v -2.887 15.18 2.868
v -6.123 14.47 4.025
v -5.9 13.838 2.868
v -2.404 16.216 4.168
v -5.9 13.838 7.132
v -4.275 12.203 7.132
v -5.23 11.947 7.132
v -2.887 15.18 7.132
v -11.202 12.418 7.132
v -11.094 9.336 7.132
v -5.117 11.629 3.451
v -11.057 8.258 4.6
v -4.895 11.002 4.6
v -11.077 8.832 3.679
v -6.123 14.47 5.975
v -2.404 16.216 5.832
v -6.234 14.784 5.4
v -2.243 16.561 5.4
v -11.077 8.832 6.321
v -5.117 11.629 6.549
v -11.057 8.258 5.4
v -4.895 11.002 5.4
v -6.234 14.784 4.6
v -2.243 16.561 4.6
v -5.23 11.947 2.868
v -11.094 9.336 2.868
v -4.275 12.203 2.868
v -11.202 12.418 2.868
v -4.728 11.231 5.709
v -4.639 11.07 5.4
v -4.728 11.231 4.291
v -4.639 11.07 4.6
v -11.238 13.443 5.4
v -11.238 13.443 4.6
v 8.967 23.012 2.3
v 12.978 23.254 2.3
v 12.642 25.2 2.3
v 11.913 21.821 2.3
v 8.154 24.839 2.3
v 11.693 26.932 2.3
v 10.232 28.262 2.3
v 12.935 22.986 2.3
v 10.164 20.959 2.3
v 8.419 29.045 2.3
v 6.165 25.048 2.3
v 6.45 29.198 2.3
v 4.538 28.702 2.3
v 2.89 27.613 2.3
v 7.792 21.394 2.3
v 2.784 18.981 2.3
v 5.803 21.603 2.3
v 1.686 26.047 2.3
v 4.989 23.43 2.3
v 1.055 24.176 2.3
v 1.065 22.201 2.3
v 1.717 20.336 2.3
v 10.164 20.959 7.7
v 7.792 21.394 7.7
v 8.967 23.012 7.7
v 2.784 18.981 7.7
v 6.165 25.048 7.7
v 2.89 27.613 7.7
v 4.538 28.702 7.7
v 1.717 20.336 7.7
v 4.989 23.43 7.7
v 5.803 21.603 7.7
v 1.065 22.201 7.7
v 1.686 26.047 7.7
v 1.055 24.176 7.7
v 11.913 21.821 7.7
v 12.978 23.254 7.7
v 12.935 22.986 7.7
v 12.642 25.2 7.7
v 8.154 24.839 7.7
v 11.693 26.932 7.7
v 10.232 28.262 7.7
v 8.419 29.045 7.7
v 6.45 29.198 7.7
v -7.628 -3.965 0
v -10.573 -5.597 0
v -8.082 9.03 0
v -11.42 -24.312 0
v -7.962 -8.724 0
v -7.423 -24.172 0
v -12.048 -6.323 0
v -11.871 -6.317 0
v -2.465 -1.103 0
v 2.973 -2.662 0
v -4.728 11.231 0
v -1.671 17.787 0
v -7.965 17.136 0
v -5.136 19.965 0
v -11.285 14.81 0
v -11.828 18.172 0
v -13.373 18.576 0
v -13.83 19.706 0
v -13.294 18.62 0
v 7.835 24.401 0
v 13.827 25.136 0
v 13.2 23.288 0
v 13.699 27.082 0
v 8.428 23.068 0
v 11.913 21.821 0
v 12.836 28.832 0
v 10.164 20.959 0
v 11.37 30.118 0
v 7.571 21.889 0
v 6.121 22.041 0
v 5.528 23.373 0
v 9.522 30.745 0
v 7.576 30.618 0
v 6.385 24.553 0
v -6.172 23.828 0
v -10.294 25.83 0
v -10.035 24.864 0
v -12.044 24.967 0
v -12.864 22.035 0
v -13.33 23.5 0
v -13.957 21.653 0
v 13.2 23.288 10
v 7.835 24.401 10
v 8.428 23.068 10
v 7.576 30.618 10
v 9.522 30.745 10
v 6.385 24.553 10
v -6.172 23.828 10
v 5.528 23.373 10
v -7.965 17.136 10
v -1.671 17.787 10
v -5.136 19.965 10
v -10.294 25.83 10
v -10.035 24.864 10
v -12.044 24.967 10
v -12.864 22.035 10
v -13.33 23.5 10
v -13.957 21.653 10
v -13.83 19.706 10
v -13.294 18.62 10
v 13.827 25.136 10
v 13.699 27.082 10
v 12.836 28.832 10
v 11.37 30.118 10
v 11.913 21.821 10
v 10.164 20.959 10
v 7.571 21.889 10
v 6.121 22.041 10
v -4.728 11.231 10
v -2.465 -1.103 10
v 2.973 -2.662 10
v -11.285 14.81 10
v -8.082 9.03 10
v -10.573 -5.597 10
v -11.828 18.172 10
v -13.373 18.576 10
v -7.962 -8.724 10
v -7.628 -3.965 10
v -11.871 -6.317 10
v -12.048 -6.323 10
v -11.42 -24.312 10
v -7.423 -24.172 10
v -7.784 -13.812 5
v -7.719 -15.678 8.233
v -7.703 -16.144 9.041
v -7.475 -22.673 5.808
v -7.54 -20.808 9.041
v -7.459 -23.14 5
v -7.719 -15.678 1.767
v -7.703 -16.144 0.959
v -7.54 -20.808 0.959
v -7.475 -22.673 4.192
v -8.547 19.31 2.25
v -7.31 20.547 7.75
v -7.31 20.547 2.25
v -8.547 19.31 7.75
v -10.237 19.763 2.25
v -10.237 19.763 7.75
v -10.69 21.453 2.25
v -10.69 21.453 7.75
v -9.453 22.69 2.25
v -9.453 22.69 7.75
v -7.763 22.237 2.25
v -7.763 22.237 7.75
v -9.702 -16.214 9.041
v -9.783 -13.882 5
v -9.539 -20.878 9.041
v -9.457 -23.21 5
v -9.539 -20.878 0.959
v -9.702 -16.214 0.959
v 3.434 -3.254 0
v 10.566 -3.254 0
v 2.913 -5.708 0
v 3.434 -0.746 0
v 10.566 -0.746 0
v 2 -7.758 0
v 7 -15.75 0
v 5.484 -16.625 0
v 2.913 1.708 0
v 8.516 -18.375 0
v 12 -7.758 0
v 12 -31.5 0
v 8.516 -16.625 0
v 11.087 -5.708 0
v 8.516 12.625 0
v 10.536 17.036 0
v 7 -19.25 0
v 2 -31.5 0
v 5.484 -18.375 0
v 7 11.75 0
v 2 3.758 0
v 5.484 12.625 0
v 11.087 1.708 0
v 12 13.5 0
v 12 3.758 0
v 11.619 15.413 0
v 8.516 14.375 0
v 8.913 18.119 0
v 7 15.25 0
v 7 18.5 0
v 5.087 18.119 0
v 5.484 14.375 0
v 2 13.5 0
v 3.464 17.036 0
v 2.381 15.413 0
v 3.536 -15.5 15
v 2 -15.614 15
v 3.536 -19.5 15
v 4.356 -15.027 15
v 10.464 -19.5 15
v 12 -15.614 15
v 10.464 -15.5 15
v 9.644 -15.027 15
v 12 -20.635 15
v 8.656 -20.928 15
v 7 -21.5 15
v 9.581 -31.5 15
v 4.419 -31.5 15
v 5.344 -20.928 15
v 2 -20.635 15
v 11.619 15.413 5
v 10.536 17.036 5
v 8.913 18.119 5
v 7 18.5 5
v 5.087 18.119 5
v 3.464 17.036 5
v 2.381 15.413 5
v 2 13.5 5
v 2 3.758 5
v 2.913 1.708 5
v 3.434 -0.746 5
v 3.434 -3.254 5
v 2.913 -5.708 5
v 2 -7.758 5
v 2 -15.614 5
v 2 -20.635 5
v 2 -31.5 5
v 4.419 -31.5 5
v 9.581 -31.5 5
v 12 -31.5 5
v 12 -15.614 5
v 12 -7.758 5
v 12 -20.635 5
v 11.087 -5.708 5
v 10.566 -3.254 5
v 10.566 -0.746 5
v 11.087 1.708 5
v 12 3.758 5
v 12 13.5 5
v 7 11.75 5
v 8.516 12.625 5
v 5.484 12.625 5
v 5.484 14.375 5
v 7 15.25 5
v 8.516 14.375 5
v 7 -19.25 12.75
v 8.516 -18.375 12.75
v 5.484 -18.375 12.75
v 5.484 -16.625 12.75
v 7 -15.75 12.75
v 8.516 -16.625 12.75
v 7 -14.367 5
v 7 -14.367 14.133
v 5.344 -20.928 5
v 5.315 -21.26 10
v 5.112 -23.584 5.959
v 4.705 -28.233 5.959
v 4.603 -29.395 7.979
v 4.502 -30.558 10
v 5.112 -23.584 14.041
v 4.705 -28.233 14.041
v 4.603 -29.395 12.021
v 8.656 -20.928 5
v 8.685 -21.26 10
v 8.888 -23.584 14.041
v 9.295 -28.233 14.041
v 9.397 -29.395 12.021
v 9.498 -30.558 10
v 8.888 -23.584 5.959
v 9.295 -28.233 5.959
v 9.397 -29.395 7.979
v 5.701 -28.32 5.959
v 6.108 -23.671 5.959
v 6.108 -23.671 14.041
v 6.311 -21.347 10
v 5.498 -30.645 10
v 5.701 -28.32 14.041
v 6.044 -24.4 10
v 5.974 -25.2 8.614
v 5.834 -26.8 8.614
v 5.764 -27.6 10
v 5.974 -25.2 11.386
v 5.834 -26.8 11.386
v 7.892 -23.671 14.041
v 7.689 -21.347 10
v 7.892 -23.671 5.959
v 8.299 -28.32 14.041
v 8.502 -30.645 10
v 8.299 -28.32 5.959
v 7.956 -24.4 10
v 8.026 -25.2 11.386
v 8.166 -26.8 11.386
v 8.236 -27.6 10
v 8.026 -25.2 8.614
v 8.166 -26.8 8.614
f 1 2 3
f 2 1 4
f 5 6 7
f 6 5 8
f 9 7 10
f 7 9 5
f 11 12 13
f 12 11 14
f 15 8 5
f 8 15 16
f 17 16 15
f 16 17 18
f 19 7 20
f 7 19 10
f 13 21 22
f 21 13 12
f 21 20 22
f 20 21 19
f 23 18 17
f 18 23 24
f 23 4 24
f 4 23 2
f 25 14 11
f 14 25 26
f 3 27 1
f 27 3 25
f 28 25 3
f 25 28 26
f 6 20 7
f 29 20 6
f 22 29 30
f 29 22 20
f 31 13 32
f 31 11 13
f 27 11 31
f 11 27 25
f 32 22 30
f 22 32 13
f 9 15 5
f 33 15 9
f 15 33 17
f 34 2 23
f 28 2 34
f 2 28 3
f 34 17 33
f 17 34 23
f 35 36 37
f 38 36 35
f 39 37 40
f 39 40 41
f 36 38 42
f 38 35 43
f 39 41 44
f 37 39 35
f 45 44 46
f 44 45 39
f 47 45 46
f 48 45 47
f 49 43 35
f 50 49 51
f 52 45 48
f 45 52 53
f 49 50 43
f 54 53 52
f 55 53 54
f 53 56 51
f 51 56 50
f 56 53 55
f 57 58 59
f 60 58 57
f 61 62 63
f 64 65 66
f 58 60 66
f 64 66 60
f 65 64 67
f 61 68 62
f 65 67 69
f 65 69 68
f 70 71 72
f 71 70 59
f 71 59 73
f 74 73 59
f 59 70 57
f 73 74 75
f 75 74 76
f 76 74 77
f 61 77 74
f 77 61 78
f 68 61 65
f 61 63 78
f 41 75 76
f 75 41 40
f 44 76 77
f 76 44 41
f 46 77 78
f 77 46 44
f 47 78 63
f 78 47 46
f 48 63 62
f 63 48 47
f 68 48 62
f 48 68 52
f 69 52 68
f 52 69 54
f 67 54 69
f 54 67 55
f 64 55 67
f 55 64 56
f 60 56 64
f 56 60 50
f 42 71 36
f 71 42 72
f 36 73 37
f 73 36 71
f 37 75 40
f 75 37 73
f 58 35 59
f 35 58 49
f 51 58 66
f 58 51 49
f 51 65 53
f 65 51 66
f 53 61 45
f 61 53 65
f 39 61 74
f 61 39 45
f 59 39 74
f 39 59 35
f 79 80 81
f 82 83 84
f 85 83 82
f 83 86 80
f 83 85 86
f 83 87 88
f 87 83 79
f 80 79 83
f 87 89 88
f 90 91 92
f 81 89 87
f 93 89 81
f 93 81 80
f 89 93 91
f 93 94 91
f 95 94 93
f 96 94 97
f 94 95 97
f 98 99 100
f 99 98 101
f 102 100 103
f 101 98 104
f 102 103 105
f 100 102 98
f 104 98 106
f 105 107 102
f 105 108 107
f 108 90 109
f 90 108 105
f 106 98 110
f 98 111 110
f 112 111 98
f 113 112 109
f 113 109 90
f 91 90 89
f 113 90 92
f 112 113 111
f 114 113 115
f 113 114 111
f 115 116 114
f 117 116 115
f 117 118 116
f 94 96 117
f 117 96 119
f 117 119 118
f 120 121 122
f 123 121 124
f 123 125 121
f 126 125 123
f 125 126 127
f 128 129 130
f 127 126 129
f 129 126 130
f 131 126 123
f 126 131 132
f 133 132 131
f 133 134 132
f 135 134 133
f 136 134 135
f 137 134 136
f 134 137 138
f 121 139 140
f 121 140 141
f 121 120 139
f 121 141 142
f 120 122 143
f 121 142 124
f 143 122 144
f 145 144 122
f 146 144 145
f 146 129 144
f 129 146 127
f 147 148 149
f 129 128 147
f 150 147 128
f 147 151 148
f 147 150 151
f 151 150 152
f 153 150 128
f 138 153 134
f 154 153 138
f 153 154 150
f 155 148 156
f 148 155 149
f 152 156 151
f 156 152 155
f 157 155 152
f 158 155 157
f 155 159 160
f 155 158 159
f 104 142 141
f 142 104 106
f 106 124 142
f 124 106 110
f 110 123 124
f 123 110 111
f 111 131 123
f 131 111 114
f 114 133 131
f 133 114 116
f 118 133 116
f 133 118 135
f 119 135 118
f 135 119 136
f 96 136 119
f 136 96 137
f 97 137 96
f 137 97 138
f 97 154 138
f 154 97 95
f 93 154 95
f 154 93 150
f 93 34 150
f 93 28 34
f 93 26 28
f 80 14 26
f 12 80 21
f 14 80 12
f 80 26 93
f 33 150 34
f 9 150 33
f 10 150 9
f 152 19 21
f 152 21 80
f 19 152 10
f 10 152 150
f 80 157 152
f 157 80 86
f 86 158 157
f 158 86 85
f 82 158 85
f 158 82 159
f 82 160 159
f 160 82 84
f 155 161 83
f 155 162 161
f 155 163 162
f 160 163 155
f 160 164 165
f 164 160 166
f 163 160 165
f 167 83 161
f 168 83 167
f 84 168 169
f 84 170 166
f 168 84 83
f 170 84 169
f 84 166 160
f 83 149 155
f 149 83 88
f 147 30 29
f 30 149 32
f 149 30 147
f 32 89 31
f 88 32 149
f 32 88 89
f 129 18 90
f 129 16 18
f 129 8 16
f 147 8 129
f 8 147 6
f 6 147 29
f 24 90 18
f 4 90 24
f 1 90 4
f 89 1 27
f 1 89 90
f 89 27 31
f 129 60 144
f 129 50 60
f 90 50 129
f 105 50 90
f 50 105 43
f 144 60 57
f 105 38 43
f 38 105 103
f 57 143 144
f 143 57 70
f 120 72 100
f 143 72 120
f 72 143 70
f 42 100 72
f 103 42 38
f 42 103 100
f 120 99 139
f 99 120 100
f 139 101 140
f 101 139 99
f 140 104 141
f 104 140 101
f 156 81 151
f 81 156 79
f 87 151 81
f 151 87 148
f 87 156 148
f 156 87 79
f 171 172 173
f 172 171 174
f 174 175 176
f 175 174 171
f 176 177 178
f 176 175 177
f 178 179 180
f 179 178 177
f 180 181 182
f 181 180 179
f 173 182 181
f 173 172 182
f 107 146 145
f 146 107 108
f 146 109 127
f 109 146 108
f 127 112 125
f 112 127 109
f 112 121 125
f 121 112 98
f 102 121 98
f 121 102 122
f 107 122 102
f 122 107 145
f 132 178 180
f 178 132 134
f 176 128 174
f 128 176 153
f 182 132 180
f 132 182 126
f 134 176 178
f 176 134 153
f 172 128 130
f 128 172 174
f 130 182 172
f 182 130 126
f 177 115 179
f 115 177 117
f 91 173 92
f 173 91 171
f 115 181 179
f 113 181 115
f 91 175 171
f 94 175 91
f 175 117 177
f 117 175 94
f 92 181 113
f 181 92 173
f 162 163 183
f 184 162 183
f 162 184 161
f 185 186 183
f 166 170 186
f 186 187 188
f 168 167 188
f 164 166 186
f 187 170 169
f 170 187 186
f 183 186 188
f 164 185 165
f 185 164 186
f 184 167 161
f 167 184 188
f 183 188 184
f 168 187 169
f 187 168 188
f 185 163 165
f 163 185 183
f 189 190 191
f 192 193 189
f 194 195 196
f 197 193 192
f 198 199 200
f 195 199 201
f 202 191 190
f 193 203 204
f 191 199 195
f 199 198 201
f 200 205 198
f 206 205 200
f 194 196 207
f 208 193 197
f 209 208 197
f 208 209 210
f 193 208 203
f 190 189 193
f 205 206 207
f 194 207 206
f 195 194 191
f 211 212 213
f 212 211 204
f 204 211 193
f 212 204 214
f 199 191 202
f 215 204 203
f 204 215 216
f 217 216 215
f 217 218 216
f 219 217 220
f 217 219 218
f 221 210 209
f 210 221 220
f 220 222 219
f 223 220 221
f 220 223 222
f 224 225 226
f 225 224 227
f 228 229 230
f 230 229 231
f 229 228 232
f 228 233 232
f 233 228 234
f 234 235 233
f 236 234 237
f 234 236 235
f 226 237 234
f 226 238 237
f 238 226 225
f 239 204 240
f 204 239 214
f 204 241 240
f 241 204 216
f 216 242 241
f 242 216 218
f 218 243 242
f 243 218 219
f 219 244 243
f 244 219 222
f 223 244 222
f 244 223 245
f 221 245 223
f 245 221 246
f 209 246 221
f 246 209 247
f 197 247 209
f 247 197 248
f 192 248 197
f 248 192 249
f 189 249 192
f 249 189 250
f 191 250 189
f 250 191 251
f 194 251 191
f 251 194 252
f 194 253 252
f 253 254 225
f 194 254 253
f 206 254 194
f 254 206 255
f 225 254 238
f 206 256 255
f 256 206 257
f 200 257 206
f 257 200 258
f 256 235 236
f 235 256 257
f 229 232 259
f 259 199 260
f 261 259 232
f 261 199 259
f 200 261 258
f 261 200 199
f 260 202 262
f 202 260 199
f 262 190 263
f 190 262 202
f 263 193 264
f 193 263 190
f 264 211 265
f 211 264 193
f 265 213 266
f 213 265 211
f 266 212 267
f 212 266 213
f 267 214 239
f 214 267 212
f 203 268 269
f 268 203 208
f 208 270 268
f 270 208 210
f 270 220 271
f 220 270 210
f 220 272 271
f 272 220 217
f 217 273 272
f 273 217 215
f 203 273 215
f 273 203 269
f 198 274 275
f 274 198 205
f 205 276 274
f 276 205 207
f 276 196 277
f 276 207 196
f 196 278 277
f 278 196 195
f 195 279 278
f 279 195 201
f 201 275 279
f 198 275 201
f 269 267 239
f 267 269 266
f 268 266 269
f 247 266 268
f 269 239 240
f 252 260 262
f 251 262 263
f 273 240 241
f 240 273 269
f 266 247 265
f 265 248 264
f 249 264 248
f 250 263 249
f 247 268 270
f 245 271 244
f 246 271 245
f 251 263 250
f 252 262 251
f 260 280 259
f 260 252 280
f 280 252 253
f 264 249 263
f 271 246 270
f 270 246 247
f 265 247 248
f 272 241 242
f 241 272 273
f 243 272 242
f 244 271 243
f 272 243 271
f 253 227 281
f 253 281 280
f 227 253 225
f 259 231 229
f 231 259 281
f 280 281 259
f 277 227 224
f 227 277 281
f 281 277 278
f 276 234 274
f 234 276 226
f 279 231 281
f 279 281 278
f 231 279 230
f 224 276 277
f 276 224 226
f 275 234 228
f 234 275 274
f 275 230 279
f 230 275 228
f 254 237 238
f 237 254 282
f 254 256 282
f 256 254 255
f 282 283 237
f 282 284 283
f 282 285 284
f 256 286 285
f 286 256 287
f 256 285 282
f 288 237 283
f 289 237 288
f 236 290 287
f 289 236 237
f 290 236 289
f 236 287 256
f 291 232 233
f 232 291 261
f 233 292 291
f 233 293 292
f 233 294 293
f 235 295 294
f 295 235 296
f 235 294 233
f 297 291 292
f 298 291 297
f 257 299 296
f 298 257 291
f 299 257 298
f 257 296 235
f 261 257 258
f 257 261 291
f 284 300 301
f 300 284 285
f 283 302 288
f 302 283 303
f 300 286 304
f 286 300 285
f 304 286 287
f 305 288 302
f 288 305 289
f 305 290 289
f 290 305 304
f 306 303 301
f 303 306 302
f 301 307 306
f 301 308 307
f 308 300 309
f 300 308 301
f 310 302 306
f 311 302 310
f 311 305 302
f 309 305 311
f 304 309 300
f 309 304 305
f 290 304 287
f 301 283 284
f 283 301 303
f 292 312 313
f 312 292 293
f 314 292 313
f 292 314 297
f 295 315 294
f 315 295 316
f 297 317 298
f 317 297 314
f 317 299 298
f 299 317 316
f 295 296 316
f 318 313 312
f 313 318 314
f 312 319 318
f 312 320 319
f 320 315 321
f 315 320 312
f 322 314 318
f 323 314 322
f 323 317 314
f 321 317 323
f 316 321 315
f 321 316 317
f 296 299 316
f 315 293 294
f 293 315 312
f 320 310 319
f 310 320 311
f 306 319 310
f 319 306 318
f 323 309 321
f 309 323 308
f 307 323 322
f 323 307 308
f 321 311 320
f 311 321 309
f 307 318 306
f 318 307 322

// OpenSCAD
// Derived from Thingiverse Thing 28241
//  http://www.thingiverse.com/thing:28241/

filament_d = 1.75;
spring_d = 8;

//render_part="idler";
//render_part="base";
//render_part="assembly";
render_part="plate";

if(render_part=="plate") plate();

if(render_part=="idler") {
    % translate([0,0,-1.0]) cube([32.0,60.0,2.0],center=true);
    translate([-10,15,0]) rotate([0,0,90+30]) idler();
}


if(render_part=="base") base();

if(render_part=="assembly") assembly();

module plate(){
    % translate([0,0,-1.0]) cube([28.0,64.0,2.0],center=true);
    translate([-9,21,0]) rotate([0,0,90+15]) idler();
    translate([7,-2,0]) rotate(90) base();
}

module assembly(){
union(){
translate([0, 15.5, 0]) base();
translate([15.5, 15.5, 0]) {
	%translate([-15.5, -15.5, 0]) translate([10.56 / 2 + 4 + filament_d, 0, 7.7]) linear_extrude(height = 4, convexity = 5) difference() {// 693 bearing
		circle(4);
		circle(1.5, $fn = 6);
	}

	translate([0, 0, 5]) rotate(-9) idler();
}
%translate([-15.5+9,20.5,0])cube([30,5,15]);
%translate([0, 0, 2]) difference() {// drive gear
	linear_extrude(height = 11, convexity = 5) difference() {
		circle(6.3);
		circle(2.5);
	}
	translate([0, 0, 7.7]) rotate_extrude(convexity = 5, $fs = 0.5) translate([5 + 2.5, 0, 0]) circle(r = 2);
}}}

module idler(idler_h=10,filament_h=4.6) difference() {
	linear_extrude(height = idler_h, convexity = 5) difference() {
		union() {
			circle(5);
			translate([0, -18.5, 0]) circle(5);
			rotate(180) translate([-5, 0, 0]) square([10, 18.5]);
			rotate(104){
				translate([1,0]) square([4, 25]);
				translate([1,22.5])square([14.8,4]);
			}
			rotate(77)translate([0,27.2])square([4,18]);
            rotate(77)translate([-0.5,0]) square([3,27.2]);
			rotate(50) translate([-8, -2, 0]) square([5, 10]);
		}
		circle(3 * 7/12, $fn = 6);
		rotate(9) translate([-15.5 + 10.56 / 2 + 4 + filament_d, -15.5, 0]) circle(2.5* 7/12, $fn = 6);
	}
	translate([0, 0, idler_h/2]) {
		#rotate(9) translate([-15.5 + 10.56 / 2 + 4 + filament_d, -15.5, 0]) linear_extrude(height = idler_h-filament_h, convexity = 5, center = true) difference() {
			circle(6);
			circle(2, $fn = 6);
		}
		#translate([10.56 / 2 + 1.5, 0, 0]) {
            hull() {
                translate([0,0,-(idler_h-2*filament_h)/2]) rotate([-90,0,9]) translate([-15.5, 0, -15.5]) cylinder(r = 2, h = 50, $fn = 6);
                translate([0,0,(idler_h-2*filament_h)/2]) rotate([-90,0,9]) translate([-15.5, 0, -15.5]) cylinder(r = 2, h = 50, $fn = 6);
            }
            hull() {
                translate([0,0,-(idler_h-2*filament_h)/2]) rotate([-90, 0, 0]) translate([-15.5, 0, -15.5]) rotate([0, 0, 0]) cylinder(r = 2, h = 100, center = true, $fn = 6);
                translate([0,0,(idler_h-2*filament_h)/2]) rotate([-90, 0, 0]) translate([-15.5, 0, -15.5]) rotate([0, 0, 0]) cylinder(r = 2, h = 100, center = true, $fn = 6);
            }
        }
	}
	translate([0, 0, idler_h - 4]) cylinder(r1 = 0, r2 = 8, h = 8, $fn = 6);
	translate([0, 0, -4]) cylinder(r2 = 0, r1 = 8, h = 8, $fn = 6);
	translate([0, 0, idler_h / 2]) rotate([90, 0, -13]) translate([-24-15.5, 0, -2]) cylinder(r = spring_d * 7/12, h = idler_h, $fn = 6);
}

module base() difference() {
	linear_extrude(height = 15, convexity = 5) difference() {
		union() {
			translate([-7,0,0])square([45, 10], center = true);
			translate([15.5, 0, 0]) circle(5);
		}
		for (side = [1, -1]) translate([side * 15.5, 0, 0]) circle(3 * 7/12, $fn = 6);
		translate([0, -15.5, 0]) circle(12);
		translate([0, 15.5, 0]) circle(12);
	}
	rotate([0,0,14])translate([-12, -10, 5]) linear_extrude(height = 15, convexity = 5)square(100);
	rotate([0,0,-14])translate([-12, -10, 5]) linear_extrude(height = 15, convexity = 5)square(100);
	translate([-15.5, 0, 15 - 4]) cylinder(r1 = 0, r2 = 8, h = 8, $fn = 6);
	rotate(-5) translate([-39,0,5])cube([20,10,20]);
	rotate(5) translate([-39,0,5])mirror([0,1,0]) cube([20,10,20]);
	#rotate(-5) translate([-24, 1.0, 10]) rotate([90,0,0])cylinder(r = spring_d * 7/12,h=2.0, $fn = 6);
	#rotate(5) translate([-24, -1.0, 10]) rotate([-90,0,0])cylinder(r = spring_d * 7/12,h=2.0, $fn = 6);
    translate([-24,0,10]) rotate([90,0,0]) cylinder(d=3.2,h=10,$fn=6,center=true);
}
